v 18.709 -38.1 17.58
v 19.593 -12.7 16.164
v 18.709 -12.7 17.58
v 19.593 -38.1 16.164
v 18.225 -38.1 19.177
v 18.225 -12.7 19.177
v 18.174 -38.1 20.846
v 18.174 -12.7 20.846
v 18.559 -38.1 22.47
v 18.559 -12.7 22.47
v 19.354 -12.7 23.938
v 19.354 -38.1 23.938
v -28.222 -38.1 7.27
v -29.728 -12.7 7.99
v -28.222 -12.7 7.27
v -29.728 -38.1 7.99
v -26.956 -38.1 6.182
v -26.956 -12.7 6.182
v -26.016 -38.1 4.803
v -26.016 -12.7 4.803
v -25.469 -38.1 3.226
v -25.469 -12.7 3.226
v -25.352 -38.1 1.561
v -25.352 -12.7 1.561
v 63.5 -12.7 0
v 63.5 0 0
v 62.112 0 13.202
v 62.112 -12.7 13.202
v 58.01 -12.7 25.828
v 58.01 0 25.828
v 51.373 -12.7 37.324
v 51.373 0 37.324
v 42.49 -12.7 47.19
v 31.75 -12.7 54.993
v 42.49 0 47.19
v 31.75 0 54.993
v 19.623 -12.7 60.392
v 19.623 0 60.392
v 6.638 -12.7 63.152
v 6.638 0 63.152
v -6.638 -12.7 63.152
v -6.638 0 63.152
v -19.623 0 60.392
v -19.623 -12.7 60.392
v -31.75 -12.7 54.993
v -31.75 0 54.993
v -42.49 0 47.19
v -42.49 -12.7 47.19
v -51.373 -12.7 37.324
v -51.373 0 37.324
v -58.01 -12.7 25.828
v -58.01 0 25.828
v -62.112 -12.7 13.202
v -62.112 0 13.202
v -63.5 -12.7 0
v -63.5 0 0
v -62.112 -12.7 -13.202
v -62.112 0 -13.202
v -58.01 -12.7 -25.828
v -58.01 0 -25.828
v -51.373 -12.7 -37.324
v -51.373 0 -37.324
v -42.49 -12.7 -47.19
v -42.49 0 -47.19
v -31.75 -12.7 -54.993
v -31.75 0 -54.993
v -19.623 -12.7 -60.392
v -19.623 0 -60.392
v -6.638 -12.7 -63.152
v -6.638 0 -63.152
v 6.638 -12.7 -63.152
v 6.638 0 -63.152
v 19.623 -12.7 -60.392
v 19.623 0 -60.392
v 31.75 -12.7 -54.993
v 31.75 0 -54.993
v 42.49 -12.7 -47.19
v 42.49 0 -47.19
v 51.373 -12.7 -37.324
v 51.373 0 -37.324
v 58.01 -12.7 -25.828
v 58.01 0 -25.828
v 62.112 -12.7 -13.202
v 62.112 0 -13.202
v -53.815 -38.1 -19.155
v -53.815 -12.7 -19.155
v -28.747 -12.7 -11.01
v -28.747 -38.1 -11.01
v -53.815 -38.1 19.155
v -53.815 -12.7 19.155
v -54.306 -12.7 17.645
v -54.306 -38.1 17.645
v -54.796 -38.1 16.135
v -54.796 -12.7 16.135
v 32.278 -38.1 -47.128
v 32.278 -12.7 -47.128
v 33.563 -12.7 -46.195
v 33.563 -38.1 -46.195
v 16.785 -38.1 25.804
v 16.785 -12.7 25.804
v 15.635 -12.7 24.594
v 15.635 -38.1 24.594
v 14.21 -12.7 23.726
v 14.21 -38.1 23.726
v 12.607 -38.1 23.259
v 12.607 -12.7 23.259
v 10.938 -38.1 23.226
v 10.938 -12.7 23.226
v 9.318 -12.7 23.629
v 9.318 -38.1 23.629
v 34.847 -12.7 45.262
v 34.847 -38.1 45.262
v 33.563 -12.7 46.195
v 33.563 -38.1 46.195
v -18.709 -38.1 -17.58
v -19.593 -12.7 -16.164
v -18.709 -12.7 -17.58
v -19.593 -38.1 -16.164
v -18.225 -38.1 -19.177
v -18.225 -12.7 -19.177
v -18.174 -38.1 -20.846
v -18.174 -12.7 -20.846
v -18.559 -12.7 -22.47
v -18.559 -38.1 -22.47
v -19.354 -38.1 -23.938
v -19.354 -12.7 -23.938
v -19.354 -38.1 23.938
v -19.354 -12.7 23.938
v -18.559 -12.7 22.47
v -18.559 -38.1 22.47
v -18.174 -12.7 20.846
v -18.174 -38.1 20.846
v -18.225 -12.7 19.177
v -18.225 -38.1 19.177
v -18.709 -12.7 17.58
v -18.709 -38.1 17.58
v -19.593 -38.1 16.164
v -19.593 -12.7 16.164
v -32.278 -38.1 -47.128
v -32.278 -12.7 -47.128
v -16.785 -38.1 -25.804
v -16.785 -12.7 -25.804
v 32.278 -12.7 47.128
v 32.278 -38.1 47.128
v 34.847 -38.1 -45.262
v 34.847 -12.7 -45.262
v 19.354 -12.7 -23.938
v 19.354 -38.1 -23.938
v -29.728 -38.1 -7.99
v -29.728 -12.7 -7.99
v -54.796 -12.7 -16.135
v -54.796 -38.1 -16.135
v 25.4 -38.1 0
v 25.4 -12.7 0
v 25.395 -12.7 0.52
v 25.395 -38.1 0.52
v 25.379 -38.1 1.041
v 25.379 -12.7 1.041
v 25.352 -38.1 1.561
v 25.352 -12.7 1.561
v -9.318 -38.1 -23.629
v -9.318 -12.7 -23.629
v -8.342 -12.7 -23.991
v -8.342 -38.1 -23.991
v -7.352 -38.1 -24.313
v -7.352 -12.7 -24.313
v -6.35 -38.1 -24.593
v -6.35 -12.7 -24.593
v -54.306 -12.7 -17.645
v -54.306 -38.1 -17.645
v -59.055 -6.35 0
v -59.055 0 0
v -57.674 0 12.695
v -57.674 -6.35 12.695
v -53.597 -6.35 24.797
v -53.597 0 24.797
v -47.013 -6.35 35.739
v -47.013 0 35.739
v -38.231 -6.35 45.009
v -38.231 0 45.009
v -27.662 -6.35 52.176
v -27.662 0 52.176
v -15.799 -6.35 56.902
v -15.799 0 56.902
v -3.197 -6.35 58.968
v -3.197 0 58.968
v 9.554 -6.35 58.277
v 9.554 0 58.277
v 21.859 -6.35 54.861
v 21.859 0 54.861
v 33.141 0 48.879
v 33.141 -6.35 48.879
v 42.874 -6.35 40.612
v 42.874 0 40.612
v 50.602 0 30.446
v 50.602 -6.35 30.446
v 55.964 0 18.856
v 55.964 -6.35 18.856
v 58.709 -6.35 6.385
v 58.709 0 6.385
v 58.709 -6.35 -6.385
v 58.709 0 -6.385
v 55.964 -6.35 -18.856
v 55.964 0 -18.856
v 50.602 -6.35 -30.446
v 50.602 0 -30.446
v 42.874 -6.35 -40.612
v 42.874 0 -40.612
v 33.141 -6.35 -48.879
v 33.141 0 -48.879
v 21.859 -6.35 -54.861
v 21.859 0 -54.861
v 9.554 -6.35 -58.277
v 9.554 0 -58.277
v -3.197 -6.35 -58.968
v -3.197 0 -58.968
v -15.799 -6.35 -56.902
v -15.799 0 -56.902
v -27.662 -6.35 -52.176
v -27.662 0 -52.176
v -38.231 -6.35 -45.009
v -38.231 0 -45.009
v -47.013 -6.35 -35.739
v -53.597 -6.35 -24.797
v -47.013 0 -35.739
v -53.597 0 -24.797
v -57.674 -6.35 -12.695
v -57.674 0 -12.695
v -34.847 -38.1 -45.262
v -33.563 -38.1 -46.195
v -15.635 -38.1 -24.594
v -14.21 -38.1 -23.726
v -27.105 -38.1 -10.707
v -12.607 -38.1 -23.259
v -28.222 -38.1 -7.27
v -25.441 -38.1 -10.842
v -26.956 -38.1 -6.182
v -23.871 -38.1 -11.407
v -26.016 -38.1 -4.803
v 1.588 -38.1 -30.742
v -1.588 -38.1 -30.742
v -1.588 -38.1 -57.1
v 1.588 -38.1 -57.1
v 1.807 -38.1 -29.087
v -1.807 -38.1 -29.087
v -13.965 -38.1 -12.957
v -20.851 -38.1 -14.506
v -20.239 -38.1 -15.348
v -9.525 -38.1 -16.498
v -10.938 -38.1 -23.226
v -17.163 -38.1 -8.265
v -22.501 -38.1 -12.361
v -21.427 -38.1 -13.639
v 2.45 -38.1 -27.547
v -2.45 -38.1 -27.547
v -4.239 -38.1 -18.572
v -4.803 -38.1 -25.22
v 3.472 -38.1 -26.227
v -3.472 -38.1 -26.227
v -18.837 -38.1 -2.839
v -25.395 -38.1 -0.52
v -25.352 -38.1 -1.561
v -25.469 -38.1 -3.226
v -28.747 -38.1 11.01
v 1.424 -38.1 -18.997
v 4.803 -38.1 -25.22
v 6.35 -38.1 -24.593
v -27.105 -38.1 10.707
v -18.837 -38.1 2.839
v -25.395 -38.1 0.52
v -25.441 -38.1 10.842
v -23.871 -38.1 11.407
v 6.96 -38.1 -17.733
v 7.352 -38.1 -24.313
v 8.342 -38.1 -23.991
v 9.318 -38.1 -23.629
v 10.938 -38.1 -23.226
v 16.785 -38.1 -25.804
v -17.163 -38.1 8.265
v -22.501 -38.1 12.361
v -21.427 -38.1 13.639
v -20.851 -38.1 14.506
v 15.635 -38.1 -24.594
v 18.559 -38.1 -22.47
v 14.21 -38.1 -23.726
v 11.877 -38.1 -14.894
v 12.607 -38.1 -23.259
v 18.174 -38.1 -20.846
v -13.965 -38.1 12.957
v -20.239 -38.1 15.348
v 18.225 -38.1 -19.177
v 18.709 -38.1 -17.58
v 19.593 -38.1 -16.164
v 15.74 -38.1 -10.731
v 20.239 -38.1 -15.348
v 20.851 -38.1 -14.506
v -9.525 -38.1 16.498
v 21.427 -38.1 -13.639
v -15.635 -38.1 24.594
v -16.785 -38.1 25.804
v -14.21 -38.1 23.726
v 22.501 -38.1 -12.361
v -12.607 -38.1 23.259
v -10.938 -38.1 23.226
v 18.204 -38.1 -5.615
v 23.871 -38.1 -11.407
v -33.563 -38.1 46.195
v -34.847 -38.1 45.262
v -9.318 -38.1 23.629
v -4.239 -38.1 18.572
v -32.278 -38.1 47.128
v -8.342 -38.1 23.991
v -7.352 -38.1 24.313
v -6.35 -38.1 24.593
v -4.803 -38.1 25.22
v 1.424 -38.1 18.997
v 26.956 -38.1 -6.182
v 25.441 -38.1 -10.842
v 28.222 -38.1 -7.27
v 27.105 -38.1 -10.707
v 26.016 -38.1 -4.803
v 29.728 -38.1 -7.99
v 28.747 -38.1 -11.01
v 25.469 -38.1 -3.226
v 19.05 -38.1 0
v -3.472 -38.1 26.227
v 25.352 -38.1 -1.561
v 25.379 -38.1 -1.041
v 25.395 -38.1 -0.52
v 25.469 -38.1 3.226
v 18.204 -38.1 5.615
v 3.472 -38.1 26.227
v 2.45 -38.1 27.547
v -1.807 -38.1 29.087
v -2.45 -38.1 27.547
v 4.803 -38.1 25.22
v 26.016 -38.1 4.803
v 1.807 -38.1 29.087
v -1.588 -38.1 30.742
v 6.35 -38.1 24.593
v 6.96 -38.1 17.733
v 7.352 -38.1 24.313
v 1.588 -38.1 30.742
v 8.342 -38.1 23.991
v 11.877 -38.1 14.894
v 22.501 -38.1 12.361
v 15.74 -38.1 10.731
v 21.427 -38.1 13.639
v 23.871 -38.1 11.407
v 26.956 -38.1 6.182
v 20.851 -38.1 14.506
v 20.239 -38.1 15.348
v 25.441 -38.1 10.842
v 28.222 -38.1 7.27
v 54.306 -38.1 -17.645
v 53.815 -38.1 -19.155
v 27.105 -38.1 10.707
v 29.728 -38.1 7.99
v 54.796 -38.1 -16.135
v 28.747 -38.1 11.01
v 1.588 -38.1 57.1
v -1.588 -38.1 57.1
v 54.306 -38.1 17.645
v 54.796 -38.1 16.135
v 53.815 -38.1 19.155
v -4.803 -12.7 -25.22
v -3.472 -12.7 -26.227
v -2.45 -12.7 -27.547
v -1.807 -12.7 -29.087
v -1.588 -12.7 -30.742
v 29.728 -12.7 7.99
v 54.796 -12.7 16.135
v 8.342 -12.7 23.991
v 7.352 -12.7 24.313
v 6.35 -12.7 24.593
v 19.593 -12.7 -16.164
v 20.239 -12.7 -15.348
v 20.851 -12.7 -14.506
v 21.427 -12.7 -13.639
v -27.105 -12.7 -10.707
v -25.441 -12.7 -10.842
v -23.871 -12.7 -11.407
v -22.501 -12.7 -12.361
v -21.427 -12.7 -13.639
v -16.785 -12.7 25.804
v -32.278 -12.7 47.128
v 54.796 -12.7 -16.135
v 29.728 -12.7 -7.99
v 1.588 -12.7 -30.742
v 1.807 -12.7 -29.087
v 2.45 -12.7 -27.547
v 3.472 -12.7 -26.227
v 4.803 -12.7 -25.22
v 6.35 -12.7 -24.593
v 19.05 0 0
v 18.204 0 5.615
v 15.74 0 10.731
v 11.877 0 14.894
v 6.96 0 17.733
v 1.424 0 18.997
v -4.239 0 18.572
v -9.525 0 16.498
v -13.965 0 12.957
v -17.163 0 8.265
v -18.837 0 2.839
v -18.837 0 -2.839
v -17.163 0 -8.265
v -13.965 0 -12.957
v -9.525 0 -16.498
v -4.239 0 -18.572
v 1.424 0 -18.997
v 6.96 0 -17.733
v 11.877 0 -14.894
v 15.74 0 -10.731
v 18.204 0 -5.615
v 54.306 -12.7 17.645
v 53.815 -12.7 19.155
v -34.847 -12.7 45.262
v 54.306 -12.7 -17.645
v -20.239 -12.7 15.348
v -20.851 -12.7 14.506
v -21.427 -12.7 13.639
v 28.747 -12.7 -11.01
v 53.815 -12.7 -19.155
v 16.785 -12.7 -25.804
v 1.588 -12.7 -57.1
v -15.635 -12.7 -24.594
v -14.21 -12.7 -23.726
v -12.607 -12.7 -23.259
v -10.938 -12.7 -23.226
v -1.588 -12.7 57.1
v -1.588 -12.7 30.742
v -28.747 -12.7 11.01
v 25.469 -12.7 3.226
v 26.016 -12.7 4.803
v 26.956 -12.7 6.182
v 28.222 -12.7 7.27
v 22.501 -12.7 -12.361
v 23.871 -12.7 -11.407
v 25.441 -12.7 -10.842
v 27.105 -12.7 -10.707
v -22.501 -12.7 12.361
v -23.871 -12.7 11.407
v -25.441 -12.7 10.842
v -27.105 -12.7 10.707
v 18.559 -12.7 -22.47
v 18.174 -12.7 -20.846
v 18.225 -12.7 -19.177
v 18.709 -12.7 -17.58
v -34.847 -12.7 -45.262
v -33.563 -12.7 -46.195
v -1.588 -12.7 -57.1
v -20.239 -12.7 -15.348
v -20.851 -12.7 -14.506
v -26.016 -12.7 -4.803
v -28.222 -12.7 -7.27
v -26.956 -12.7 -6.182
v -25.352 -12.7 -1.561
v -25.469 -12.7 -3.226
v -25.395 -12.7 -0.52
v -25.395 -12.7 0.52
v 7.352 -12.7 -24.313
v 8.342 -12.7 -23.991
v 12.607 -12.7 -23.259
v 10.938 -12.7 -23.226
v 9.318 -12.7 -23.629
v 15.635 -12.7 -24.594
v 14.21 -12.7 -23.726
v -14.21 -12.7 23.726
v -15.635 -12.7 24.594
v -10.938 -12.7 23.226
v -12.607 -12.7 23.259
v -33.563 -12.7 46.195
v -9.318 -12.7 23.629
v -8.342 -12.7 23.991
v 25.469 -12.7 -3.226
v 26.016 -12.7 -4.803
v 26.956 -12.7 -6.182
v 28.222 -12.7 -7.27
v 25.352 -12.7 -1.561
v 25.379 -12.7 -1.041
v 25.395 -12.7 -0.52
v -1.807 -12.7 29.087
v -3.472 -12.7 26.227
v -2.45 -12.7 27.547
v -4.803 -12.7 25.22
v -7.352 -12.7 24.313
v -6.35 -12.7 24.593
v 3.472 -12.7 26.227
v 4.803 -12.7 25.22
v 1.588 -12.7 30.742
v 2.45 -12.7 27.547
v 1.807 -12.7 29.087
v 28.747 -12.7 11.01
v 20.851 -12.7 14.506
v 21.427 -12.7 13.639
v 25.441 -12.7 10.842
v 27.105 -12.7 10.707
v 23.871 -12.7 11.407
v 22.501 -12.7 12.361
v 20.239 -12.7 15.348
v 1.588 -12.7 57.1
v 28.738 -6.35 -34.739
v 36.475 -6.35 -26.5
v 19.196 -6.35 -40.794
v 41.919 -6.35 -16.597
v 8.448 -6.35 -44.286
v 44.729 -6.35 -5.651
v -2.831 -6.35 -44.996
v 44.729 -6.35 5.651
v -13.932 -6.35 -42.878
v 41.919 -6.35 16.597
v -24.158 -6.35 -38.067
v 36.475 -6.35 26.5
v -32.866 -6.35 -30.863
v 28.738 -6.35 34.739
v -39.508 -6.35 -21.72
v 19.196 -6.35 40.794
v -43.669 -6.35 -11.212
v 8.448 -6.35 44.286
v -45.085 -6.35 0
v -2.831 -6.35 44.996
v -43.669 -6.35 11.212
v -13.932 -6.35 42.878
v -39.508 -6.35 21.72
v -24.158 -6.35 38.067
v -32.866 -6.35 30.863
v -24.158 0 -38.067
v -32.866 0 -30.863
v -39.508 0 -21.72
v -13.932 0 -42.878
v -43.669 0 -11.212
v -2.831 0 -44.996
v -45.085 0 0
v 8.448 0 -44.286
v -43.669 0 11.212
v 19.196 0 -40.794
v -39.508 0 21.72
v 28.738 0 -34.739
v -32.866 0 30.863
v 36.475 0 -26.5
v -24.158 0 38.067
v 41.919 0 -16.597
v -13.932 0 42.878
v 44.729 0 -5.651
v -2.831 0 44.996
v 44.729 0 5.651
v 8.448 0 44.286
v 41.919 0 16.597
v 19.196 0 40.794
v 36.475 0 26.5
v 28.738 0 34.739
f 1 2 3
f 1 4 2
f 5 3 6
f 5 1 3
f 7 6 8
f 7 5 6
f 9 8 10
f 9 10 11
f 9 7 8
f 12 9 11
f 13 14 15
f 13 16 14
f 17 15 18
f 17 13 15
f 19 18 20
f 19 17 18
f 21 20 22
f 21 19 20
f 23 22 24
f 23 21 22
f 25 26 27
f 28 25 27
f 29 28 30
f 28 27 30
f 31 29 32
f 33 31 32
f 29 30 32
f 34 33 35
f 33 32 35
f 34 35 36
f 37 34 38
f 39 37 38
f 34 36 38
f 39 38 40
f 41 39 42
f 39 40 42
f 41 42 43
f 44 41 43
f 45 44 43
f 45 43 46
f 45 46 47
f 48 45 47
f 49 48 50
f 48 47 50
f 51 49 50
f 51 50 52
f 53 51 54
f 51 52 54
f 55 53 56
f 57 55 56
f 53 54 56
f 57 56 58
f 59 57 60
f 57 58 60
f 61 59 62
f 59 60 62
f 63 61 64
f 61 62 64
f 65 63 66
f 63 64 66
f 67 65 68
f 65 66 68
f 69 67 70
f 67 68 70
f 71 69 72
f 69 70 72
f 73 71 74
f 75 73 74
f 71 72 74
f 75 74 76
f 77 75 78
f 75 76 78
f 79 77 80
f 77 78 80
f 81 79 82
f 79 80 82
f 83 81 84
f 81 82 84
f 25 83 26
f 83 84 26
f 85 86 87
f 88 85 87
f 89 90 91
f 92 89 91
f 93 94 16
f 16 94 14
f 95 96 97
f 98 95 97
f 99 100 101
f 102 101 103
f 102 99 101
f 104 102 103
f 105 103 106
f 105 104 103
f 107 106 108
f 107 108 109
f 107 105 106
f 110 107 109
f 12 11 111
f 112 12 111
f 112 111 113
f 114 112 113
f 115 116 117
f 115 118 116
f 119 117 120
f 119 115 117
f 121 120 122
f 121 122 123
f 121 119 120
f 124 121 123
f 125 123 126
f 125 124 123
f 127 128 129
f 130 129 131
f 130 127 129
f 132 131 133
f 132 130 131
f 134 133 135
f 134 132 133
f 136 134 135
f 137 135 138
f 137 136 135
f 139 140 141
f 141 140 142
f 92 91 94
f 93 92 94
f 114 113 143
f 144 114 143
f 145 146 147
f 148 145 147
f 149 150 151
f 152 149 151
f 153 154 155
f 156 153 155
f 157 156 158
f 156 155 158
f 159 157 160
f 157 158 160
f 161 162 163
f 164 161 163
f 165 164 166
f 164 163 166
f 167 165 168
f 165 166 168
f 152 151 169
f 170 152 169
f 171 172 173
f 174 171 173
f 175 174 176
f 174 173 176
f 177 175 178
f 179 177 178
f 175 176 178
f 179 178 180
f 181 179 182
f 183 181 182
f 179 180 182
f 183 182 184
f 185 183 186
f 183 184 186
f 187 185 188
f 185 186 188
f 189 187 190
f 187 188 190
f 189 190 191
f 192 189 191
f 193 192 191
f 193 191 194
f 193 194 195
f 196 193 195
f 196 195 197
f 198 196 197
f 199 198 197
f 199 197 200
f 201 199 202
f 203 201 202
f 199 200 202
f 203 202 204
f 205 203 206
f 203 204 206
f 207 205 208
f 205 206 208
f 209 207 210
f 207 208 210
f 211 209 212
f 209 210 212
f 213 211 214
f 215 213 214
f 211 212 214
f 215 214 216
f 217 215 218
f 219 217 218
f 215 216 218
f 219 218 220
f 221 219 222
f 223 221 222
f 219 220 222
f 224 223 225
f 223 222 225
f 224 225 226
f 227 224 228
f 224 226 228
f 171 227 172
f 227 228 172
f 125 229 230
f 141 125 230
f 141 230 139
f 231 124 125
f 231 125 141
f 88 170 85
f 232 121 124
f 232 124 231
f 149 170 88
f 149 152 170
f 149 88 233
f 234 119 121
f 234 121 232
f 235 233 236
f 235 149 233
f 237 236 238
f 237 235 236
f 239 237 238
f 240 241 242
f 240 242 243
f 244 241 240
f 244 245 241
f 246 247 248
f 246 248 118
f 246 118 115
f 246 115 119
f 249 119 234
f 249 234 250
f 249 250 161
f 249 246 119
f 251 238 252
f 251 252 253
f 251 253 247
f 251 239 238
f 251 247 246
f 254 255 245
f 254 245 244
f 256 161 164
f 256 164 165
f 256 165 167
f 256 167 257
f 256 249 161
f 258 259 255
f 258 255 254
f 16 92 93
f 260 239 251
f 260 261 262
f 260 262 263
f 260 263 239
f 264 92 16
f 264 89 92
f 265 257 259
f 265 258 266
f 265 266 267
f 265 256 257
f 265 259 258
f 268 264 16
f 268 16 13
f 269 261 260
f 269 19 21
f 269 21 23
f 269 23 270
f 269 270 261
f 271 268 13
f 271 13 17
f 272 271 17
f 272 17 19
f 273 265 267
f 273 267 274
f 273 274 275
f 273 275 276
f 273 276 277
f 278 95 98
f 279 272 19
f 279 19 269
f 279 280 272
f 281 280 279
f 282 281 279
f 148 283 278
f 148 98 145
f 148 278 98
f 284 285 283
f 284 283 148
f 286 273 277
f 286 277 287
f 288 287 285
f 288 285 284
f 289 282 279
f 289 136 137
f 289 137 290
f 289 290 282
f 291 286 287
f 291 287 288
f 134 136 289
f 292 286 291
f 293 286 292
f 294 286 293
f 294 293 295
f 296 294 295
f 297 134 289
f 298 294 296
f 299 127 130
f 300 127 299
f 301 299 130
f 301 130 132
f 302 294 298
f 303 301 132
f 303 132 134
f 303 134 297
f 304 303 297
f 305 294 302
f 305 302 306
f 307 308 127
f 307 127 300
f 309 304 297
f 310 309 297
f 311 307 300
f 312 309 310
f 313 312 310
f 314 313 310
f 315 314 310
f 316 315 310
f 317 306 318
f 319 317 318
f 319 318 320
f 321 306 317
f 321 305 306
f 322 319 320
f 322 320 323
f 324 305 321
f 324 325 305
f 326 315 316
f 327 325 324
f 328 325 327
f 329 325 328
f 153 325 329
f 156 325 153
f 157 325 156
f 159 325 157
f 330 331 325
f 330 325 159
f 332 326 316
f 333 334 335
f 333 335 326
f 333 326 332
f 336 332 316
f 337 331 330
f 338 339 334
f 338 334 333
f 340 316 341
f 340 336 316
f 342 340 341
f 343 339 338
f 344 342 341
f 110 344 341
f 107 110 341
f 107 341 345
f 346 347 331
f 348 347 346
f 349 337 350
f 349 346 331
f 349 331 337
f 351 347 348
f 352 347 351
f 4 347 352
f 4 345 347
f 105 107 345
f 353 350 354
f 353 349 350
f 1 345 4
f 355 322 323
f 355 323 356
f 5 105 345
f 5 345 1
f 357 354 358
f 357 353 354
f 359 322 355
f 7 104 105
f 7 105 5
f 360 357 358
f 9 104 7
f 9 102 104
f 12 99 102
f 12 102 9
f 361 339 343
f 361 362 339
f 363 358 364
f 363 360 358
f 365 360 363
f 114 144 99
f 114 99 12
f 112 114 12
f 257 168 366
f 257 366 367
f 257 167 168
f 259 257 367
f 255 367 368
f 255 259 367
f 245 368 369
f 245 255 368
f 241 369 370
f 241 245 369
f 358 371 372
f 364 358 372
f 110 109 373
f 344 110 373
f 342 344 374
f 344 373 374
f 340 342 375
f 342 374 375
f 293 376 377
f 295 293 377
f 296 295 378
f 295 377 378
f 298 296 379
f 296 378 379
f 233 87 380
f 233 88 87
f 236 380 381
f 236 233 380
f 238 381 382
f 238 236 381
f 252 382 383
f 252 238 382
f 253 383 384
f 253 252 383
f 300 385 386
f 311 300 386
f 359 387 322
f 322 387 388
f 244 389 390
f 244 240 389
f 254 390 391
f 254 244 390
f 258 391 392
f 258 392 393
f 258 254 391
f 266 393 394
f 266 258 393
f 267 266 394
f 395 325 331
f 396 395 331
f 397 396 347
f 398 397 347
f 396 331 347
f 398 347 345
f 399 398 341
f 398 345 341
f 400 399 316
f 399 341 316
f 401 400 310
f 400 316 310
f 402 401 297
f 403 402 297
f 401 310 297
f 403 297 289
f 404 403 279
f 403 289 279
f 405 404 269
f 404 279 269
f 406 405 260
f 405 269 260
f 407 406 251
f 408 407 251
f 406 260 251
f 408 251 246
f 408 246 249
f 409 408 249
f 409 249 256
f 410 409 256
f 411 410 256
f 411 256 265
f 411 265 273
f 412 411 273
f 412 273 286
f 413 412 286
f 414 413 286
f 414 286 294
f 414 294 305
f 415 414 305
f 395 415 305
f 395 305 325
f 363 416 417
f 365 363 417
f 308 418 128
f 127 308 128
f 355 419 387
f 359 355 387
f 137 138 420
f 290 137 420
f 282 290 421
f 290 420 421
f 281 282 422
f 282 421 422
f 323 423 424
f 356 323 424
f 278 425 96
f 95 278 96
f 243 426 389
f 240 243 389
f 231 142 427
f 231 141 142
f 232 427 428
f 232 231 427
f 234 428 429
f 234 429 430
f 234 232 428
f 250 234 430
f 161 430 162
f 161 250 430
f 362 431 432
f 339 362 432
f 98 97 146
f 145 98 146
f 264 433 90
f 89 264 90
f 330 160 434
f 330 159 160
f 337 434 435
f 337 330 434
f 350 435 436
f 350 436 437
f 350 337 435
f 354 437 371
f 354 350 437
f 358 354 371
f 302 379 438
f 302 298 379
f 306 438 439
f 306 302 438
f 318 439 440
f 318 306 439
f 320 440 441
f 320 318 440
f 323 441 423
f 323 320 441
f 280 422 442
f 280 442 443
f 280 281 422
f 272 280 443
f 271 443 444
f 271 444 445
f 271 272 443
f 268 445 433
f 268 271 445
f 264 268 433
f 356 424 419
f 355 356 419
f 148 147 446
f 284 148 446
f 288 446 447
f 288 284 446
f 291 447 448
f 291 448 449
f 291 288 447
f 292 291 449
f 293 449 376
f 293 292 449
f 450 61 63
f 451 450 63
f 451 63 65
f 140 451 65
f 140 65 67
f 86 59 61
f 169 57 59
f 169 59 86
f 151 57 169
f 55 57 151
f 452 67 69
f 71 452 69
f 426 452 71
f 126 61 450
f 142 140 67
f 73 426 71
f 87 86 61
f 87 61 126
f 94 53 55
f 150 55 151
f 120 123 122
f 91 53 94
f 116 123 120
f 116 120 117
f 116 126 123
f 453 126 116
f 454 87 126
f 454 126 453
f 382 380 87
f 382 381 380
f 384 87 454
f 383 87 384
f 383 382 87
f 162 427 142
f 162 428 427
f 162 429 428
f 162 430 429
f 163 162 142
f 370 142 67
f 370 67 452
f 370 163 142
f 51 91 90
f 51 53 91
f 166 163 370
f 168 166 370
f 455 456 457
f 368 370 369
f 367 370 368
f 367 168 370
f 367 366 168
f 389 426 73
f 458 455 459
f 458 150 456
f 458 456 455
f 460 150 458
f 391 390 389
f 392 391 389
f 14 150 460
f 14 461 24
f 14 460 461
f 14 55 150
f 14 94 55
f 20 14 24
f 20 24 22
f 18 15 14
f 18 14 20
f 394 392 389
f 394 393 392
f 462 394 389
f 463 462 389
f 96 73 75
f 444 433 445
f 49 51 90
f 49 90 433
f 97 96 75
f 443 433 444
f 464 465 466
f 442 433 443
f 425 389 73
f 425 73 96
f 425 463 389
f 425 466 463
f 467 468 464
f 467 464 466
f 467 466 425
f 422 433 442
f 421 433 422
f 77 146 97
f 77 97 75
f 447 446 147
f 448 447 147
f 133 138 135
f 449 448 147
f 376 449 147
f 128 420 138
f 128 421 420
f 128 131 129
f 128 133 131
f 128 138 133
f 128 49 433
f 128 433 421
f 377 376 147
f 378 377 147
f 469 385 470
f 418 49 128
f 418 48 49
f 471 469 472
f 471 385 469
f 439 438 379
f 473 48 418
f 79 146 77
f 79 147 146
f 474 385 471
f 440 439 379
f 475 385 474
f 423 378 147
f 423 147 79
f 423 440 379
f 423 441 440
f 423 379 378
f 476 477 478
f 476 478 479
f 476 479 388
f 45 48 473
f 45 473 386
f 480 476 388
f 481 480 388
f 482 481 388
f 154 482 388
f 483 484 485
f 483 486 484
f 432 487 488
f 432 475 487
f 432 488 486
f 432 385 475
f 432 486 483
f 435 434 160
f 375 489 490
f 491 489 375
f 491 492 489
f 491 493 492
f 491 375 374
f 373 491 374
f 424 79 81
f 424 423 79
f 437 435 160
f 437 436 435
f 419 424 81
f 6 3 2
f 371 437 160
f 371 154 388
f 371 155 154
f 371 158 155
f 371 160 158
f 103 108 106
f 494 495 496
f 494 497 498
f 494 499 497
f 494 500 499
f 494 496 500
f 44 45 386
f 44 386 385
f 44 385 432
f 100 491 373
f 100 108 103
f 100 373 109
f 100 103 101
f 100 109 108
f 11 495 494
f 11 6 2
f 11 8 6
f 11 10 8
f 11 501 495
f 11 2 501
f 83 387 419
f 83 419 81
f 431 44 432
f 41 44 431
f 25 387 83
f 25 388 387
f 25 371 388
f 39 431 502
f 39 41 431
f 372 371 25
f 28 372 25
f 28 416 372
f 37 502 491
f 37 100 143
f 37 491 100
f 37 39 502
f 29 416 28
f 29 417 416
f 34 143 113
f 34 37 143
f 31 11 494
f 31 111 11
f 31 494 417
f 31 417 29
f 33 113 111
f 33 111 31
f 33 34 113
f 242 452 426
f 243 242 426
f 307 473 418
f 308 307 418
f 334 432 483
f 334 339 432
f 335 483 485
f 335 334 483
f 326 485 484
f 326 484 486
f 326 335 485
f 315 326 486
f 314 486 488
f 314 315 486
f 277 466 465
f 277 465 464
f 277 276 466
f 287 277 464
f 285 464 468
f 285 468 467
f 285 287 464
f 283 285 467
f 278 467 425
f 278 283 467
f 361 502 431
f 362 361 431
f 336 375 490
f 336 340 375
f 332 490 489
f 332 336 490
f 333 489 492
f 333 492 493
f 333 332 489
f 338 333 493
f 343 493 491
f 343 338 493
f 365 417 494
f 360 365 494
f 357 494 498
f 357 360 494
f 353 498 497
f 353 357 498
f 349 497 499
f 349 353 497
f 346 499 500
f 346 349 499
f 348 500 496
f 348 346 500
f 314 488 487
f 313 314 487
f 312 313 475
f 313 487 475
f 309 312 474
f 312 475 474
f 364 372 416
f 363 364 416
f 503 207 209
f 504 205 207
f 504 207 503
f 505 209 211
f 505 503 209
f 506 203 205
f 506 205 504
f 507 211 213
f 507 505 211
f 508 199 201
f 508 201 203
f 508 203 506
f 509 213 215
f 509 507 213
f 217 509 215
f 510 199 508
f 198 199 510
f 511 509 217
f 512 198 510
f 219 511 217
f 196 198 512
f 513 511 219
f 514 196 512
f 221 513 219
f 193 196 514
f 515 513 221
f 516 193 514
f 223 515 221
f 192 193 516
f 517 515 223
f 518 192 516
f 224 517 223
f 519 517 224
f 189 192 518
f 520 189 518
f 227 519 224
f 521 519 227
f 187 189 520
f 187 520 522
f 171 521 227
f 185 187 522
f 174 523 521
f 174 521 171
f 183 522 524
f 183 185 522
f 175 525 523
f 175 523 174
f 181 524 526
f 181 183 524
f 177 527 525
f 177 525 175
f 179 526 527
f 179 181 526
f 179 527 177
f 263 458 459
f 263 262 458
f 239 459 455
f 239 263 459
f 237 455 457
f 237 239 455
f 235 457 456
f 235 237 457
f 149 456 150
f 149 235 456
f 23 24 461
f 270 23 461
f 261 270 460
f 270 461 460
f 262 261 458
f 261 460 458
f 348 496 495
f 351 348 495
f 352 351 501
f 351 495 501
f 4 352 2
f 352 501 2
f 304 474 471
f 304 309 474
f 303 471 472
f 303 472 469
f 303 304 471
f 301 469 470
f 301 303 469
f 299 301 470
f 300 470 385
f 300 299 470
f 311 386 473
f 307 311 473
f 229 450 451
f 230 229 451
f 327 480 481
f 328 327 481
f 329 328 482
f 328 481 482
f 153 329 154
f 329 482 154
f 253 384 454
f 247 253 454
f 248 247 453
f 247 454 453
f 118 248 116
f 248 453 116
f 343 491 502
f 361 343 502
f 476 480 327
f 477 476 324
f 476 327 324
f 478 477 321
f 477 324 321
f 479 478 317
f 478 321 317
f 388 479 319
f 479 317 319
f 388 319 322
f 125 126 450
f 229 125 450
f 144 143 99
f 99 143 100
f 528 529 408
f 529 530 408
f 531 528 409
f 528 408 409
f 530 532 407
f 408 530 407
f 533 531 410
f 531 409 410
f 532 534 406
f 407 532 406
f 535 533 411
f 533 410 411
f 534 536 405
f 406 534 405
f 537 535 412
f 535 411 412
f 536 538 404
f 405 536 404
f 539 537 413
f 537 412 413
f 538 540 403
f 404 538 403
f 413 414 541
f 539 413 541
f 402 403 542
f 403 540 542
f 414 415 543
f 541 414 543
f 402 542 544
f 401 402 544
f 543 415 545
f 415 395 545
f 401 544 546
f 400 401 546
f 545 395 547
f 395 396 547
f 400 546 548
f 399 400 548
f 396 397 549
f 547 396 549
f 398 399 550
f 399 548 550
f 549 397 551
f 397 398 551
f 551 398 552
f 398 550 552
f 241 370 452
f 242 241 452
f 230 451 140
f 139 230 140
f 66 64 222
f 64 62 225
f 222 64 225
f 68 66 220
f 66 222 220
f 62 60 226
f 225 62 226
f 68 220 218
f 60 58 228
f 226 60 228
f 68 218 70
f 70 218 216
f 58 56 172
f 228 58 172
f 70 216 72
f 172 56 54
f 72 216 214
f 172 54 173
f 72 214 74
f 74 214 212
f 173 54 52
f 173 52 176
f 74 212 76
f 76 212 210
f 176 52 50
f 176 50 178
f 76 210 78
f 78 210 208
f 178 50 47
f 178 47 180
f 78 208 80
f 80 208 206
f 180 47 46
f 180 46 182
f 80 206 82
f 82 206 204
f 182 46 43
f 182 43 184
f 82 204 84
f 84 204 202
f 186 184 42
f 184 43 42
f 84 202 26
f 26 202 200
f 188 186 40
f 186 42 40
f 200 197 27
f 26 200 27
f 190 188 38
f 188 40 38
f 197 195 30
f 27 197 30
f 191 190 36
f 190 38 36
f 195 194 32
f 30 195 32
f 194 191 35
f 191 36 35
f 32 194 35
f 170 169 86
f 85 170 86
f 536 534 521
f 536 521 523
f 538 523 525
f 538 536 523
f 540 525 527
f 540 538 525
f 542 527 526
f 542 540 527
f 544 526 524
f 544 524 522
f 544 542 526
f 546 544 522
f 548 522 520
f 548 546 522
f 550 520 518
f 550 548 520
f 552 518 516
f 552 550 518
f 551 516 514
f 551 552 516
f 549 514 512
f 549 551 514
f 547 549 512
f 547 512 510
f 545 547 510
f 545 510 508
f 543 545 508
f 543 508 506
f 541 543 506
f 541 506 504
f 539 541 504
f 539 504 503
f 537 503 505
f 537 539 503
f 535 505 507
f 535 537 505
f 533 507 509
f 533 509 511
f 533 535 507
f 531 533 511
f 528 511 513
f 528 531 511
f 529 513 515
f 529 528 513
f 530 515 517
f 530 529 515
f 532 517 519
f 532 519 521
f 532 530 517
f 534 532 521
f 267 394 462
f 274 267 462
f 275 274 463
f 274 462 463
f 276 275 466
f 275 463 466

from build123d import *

# Parameters (mm, degrees)
F0_R     = 63.5
F1_DEPTH = 12.7
F3_DEPTH = 25.4
F4_R     = 6.35
F5_R     = 19.05
F6_DEPTH = 38.101
F7_R     = 59.055
F7_R_2   = 45.085
F8_DEPTH = 6.35


with BuildPart() as f1:
    # F0 (on Front) → F1 (new body)
    with BuildSketch(Plane.XZ):
        Circle(F0_R)
    extrude(amount=F1_DEPTH)

    # F2 (on face) → F3 (join)
    with BuildSketch(Plane.XZ.offset(12.7)):
        with BuildLine():
            ThreePointArc((24.600173, -6.323884), (25.19925, -3.187132), (25.4, 0))
            ThreePointArc((25.4, 0), (25.19925, 3.187132), (24.600173, 6.323884))
            ThreePointArc((24.600173, 6.323884), (24.156836, 7.849032), (23.619044, 9.343489))
            ThreePointArc((23.619044, 9.343489), (20.549032, 14.929745), (16.184872, 19.575748))
            ThreePointArc((16.184872, 19.575748), (14.929745, 20.549032), (13.616243, 21.441967))
            ThreePointArc((13.616243, 21.441967), (7.849032, 24.156836), (1.5875, 25.350342))
            ThreePointArc((1.5875, 25.350342), (0, 25.4), (-1.5875, 25.350342))
            ThreePointArc((-1.5875, 25.350342), (-7.849032, 24.156836), (-13.616243, 21.441967))
            ThreePointArc((-13.616243, 21.441967), (-14.929745, 20.549032), (-16.184872, 19.575748))
            ThreePointArc((-16.184872, 19.575748), (-20.549032, 14.929745), (-23.619044, 9.343489))
            ThreePointArc((-23.619044, 9.343489), (-24.156836, 7.849032), (-24.600173, 6.323884))
            ThreePointArc((-24.600173, 6.323884), (-25.4, 0), (-24.600173, -6.323884))
            ThreePointArc((-24.600173, -6.323884), (-24.156836, -7.849032), (-23.619044, -9.343489))
            ThreePointArc((-23.619044, -9.343489), (-20.549032, -14.929745), (-16.184872, -19.575748))
            ThreePointArc((-16.184872, -19.575748), (-14.929745, -20.549032), (-13.616243, -21.441967))
            ThreePointArc((-13.616243, -21.441967), (-7.849032, -24.156836), (-1.5875, -25.350342))
            ThreePointArc((-1.5875, -25.350342), (0, -25.4), (1.5875, -25.350342))
            ThreePointArc((1.5875, -25.350342), (7.849032, -24.156836), (13.616243, -21.441967))
            ThreePointArc((13.616243, -21.441967), (14.929745, -20.549032), (16.184872, -19.575748))
            ThreePointArc((16.184872, -19.575748), (20.549032, -14.929745), (23.619044, -9.343489))
            ThreePointArc((23.619044, -9.343489), (24.156836, -7.849032), (24.600173, -6.323884))
        make_face()
        with BuildLine():
            ThreePointArc((23.619044, 9.343489), (24.156836, 7.849032), (24.600173, 6.323884))
            Line((24.600173, 6.323884), (54.796217, 16.135174))
            Line((54.796217, 16.135174), (54.305652, 17.644976))
            Line((54.305652, 17.644976), (53.815088, 19.154778))
            Line((53.815088, 19.154778), (23.619044, 9.343489))
        make_face()
        with BuildLine():
            Line((54.796217, -16.135174), (24.600173, -6.323884))
            ThreePointArc((24.600173, -6.323884), (24.156836, -7.849032), (23.619044, -9.343489))
            Line((23.619044, -9.343489), (53.815088, -19.154778))
            Line((53.815088, -19.154778), (54.305652, -17.644976))
            Line((54.305652, -17.644976), (54.796217, -16.135174))
        make_face()
        with BuildLine():
            ThreePointArc((13.616243, 21.441967), (14.929745, 20.549032), (16.184872, 19.575748))
            Line((16.184872, 19.575748), (34.847053, 45.262038))
            Line((34.847053, 45.262038), (33.562739, 46.195147))
            Line((33.562739, 46.195147), (32.278424, 47.128256))
            Line((32.278424, 47.128256), (13.616243, 21.441967))
        make_face()
        with BuildLine():
            Line((34.847053, -45.262038), (16.184872, -19.575748))
            ThreePointArc((16.184872, -19.575748), (14.929745, -20.549032), (13.616243, -21.441967))
            Line((13.616243, -21.441967), (32.278424, -47.128256))
            Line((32.278424, -47.128256), (33.562739, -46.195147))
            Line((33.562739, -46.195147), (34.847053, -45.262038))
        make_face()
        with BuildLine():
            ThreePointArc((-1.5875, 25.350342), (0, 25.4), (1.5875, 25.350342))
            Line((1.5875, 25.350342), (1.5875, 57.100342))
            Line((1.5875, 57.100342), (0, 57.100342))
            Line((0, 57.100342), (-1.5875, 57.100342))
            Line((-1.5875, 57.100342), (-1.5875, 25.350342))
        make_face()
        with BuildLine():
            Line((1.5875, -57.100342), (1.5875, -25.350342))
            ThreePointArc((1.5875, -25.350342), (0, -25.4), (-1.5875, -25.350342))
            Line((-1.5875, -25.350342), (-1.5875, -57.100342))
            Line((-1.5875, -57.100342), (0, -57.100342))
            Line((0, -57.100342), (1.5875, -57.100342))
        make_face()
        with BuildLine():
            ThreePointArc((-16.184872, 19.575748), (-14.929745, 20.549032), (-13.616243, 21.441967))
            Line((-13.616243, 21.441967), (-32.278424, 47.128256))
            Line((-32.278424, 47.128256), (-33.562739, 46.195147))
            Line((-33.562739, 46.195147), (-34.847053, 45.262038))
            Line((-34.847053, 45.262038), (-16.184872, 19.575748))
        make_face()
        with BuildLine():
            Line((-32.278424, -47.128256), (-13.616243, -21.441967))
            ThreePointArc((-13.616243, -21.441967), (-14.929745, -20.549032), (-16.184872, -19.575748))
            Line((-16.184872, -19.575748), (-34.847053, -45.262038))
            Line((-34.847053, -45.262038), (-33.562739, -46.195147))
            Line((-33.562739, -46.195147), (-32.278424, -47.128256))
        make_face()
        with BuildLine():
            ThreePointArc((-24.600173, 6.323884), (-24.156836, 7.849032), (-23.619044, 9.343489))
            Line((-23.619044, 9.343489), (-53.815088, 19.154778))
            Line((-53.815088, 19.154778), (-54.305652, 17.644976))
            Line((-54.305652, 17.644976), (-54.796217, 16.135174))
            Line((-54.796217, 16.135174), (-24.600173, 6.323884))
        make_face()
        with BuildLine():
            Line((-53.815088, -19.154778), (-23.619044, -9.343489))
            ThreePointArc((-23.619044, -9.343489), (-24.156836, -7.849032), (-24.600173, -6.323884))
            Line((-24.600173, -6.323884), (-54.796217, -16.135174))
            Line((-54.796217, -16.135174), (-54.305652, -17.644976))
            Line((-54.305652, -17.644976), (-53.815088, -19.154778))
        make_face()
    extrude(amount=F3_DEPTH)

    # F4
    f4_edges = [f1.edges().sort_by_distance(p)[0] for p in [
        (-16.184872, -25.4, 19.575748),
        (-1.5875, -25.4, 25.350342),
        (-24.600173, -25.4, 6.323884),
        (-24.600173, -25.4, -6.323884),
        (-23.619044, -25.4, -9.343489),
        (-16.184872, -25.4, -19.575748),
        (-13.616243, -25.4, -21.441967),
        (-1.5875, -25.4, -25.350342),
        (13.616243, -25.4, -21.441967),
        (1.5875, -25.4, -25.350342),
        (16.184872, -25.4, -19.575748),
        (23.619044, -25.4, -9.343489),
        (24.600173, -25.4, -6.323884),
        (24.600173, -25.4, 6.323884),
        (23.619044, -25.4, 9.343489),
        (16.184872, -25.4, 19.575748),
        (13.616243, -25.4, 21.441967),
        (1.5875, -25.4, 25.350342),
        (-13.616243, -25.4, 21.441967),
        (-23.619044, -25.4, 9.343489),
    ]]
    fillet(f4_edges, radius=F4_R)

    # F5 (on face) → F6 (cut, through all)
    with BuildSketch(Plane.XZ.offset(38.1)):
        Circle(F5_R)
    extrude(amount=-F6_DEPTH, mode=Mode.SUBTRACT)

    # F7 (on face) → F8 (cut)
    with BuildSketch(Plane(origin=(0, 0, 0), x_dir=(-1, 0, 0), z_dir=(0, 1, 0))):
        Circle(F7_R)
        Circle(F7_R_2, mode=Mode.SUBTRACT)
    extrude(amount=-F8_DEPTH, mode=Mode.SUBTRACT)


solid = f1.part
